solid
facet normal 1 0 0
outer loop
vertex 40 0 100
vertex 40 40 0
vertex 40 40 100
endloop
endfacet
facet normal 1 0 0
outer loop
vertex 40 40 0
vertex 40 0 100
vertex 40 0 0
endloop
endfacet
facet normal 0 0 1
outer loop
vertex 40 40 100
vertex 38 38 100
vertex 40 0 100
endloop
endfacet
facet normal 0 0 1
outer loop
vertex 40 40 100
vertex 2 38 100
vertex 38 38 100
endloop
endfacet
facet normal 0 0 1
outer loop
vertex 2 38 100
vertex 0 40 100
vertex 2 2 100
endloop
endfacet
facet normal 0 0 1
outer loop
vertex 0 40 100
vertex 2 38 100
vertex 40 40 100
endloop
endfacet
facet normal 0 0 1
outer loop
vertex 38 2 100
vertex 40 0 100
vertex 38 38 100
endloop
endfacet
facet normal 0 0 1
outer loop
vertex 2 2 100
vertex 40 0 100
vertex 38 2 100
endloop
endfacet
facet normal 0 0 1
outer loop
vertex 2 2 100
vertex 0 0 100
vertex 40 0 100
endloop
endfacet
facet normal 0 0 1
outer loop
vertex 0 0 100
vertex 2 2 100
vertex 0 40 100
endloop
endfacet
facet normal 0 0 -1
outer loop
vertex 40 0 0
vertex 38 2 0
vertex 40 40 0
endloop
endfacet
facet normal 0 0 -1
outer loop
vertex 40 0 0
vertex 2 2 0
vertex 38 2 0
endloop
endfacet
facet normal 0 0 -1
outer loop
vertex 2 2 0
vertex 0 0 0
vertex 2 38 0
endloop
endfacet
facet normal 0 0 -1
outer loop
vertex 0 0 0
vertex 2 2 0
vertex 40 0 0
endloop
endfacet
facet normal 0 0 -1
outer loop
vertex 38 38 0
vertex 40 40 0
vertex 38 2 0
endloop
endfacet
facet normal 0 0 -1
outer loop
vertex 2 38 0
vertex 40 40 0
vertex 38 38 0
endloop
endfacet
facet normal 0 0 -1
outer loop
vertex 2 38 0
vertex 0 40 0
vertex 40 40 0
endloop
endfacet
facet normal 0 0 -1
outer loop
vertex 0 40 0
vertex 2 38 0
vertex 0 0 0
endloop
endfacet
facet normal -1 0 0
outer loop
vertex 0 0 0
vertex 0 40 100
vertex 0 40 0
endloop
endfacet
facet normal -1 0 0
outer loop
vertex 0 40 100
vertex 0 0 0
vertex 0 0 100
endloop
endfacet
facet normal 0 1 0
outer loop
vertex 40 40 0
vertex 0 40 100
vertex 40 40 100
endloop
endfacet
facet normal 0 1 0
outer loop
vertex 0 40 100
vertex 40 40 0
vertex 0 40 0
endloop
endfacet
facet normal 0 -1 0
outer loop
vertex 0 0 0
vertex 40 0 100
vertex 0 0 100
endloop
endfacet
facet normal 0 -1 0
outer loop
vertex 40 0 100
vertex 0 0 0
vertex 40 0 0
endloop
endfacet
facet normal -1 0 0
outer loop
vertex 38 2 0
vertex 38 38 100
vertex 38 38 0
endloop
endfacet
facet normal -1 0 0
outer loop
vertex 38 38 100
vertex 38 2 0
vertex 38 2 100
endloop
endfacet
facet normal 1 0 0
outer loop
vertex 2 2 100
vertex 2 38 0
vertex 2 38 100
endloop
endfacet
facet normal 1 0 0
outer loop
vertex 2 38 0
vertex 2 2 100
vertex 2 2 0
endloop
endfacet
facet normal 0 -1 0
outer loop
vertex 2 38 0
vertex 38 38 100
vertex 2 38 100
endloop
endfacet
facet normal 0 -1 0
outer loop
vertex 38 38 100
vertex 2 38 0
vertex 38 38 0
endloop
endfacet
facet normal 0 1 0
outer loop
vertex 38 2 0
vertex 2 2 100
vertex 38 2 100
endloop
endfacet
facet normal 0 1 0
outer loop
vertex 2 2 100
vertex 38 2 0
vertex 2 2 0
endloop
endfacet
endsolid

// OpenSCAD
$fn = 64;

length = 100;
size = 40;

difference() {
  cube([size, size, length], center=false);
  translate([2, 2, -0.1]) cube([size-4, size-4, length+0.2], center=false);
}
